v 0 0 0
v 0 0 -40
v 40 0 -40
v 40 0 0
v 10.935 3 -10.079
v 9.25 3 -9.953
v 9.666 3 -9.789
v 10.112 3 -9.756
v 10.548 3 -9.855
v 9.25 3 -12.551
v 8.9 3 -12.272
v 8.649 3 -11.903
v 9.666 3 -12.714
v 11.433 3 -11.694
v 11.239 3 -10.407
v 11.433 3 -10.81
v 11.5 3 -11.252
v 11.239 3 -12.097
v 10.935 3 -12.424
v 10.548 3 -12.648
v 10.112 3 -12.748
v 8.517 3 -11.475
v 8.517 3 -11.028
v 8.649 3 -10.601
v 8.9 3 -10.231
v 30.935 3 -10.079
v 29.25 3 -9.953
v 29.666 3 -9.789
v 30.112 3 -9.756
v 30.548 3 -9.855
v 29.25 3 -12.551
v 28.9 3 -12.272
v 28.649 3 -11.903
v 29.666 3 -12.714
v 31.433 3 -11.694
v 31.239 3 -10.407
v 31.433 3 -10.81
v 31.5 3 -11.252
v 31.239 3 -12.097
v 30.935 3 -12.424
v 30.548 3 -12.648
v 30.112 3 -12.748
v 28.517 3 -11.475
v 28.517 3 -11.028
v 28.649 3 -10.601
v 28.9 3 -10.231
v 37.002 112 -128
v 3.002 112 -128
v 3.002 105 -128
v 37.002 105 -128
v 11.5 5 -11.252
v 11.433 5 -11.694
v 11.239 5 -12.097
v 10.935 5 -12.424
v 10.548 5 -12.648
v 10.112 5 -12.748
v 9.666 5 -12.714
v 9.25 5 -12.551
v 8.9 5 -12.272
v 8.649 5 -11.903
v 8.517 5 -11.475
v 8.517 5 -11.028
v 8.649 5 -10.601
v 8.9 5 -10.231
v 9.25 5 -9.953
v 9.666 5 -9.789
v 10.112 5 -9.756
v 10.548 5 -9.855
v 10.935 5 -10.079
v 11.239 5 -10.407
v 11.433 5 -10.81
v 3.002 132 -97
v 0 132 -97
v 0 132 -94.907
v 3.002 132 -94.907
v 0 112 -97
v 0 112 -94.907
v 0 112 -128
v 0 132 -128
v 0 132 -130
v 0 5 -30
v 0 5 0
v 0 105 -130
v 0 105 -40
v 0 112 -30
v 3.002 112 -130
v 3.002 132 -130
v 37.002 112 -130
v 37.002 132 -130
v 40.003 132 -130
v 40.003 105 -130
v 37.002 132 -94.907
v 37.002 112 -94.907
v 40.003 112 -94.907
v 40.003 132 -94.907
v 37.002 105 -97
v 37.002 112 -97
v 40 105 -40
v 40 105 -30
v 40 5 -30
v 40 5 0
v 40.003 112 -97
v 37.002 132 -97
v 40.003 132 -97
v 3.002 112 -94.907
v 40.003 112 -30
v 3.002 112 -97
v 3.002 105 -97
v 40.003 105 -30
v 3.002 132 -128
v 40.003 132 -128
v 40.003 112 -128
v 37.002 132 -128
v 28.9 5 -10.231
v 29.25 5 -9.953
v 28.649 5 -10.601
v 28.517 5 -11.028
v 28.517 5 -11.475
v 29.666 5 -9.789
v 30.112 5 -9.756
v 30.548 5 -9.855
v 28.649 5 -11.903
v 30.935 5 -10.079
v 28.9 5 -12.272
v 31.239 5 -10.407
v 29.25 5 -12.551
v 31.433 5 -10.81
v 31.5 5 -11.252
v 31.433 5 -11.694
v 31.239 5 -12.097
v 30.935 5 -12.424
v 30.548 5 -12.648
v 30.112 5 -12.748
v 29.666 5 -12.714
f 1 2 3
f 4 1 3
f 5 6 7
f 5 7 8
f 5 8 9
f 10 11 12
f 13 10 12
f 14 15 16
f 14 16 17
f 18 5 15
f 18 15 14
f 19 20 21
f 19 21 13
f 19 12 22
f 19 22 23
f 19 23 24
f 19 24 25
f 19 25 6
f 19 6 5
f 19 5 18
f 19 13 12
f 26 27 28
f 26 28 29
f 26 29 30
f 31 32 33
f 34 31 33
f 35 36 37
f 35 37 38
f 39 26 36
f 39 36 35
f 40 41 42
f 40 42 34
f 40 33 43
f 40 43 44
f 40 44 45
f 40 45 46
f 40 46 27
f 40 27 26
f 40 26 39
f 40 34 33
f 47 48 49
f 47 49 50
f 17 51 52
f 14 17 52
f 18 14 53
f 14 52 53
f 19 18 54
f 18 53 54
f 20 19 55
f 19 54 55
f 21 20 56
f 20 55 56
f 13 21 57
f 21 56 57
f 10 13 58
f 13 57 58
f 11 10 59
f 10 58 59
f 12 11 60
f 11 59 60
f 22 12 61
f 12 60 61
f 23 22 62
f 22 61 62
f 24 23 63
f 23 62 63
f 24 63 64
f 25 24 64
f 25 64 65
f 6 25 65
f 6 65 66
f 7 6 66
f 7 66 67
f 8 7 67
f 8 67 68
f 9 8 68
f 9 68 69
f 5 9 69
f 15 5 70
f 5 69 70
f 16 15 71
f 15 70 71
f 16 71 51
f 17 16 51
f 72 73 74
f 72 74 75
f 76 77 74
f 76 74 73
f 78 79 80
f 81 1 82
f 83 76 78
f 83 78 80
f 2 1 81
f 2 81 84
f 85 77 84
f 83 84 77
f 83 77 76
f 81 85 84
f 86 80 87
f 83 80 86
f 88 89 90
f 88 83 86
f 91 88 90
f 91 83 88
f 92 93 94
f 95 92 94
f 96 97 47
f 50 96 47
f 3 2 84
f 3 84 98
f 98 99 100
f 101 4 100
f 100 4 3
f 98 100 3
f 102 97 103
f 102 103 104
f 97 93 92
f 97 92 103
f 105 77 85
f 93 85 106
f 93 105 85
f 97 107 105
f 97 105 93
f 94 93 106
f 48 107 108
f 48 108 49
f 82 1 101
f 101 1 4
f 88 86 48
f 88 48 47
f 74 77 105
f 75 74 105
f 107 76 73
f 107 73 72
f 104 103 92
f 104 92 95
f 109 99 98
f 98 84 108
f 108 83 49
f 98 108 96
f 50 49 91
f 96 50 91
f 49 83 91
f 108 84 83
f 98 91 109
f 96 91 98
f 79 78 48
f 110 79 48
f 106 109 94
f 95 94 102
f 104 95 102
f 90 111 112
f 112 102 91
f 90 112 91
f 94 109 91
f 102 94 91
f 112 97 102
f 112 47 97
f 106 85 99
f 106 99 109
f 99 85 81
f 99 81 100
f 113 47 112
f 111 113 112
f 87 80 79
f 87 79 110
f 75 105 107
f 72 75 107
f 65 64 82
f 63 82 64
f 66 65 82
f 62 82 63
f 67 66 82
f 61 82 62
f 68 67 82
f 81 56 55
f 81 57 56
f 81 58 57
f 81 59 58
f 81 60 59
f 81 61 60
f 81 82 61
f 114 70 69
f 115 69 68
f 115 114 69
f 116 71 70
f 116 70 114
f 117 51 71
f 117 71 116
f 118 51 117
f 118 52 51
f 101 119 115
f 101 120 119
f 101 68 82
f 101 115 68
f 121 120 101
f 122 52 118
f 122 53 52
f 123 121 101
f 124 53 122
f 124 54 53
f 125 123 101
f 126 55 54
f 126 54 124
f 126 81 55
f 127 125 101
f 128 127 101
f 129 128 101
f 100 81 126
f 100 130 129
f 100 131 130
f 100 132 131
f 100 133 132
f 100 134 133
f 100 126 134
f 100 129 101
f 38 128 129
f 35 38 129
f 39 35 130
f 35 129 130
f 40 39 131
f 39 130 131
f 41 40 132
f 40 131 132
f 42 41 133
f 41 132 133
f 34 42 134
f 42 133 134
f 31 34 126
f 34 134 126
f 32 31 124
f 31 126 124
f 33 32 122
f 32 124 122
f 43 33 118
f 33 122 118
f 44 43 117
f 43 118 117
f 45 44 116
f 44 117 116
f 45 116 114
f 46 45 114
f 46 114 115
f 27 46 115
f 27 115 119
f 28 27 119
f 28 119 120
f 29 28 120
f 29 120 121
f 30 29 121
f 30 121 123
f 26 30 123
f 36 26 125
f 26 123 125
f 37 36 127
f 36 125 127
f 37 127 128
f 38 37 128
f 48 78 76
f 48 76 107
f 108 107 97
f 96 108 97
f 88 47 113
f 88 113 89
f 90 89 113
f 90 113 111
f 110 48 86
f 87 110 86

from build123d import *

# Parameters (mm, degrees)
SKETCH1_W           = 40
SKETCH1_H           = 40
BOSS_EXTRUDE1_DEPTH = 5
SKETCH2_R           = 1.5
CUT_EXTRUDE1_DEPTH  = 2
SKETCH5_W           = 40
SKETCH5_H           = 10
BOSS_EXTRUDE2_DEPTH = 100
SKETCH6_W           = 40.003445824
SKETCH6_H           = 100
BOSS_EXTRUDE3_DEPTH = 7
SKETCH7_W           = 34
SKETCH7_H           = 31
CUT_EXTRUDE2_DEPTH  = 100
SKETCH8_W           = 3.001722912
SKETCH8_H           = 2
SKETCH8_H_2         = 2.093229538
BOSS_EXTRUDE4_DEPTH = 20


with BuildPart() as part:
    # Sketch1 → Boss-Extrude1 (new body)
    with BuildSketch(Plane(origin=(0, 0, 0), x_dir=(1, 0, 0), z_dir=(0, 1, 0))):
        with Locations((20, 20)):
            Rectangle(SKETCH1_W, SKETCH1_H)
    extrude(amount=BOSS_EXTRUDE1_DEPTH)

    # Sketch2 → Cut-Extrude1 (cut)
    with BuildSketch(Plane(origin=(0, 5, 0), x_dir=(1, 0, 0), z_dir=(0, 1, 0))):
        with Locations((10, 11.251726065)):
            Circle(SKETCH2_R)
        with Locations((30, 11.251726065)):
            Circle(SKETCH2_R)
    extrude(amount=-CUT_EXTRUDE1_DEPTH, mode=Mode.SUBTRACT)

    # Sketch5 → Boss-Extrude2 (add)
    with BuildSketch(Plane(origin=(0, 5, 0), x_dir=(1, 0, 0), z_dir=(0, 1, 0))):
        with Locations((20, 35)):
            Rectangle(SKETCH5_W, SKETCH5_H)
    extrude(amount=BOSS_EXTRUDE2_DEPTH)

    # Sketch6 → Boss-Extrude3 (add)
    with BuildSketch(Plane(origin=(0, 105, 0), x_dir=(1, 0, 0), z_dir=(0, 1, 0))):
        with Locations((20.001722912, 80)):
            Rectangle(SKETCH6_W, SKETCH6_H)
    extrude(amount=BOSS_EXTRUDE3_DEPTH)

    # Sketch7 → Cut-Extrude2 (cut)
    with BuildSketch(Plane(origin=(0, 112, 0), x_dir=(1, 0, 0), z_dir=(0, 1, 0))):
        with Locations((20.001722912, 112.5)):
            Rectangle(SKETCH7_W, SKETCH7_H)
    extrude(amount=-CUT_EXTRUDE2_DEPTH, mode=Mode.SUBTRACT)

    # Sketch8 → Boss-Extrude4 (add)
    with BuildSketch(Plane(origin=(0, 112, 0), x_dir=(1, 0, 0), z_dir=(0, 1, 0))):
        with Locations((38.502584368, 129)):
            Rectangle(SKETCH8_W, SKETCH8_H)
        with Locations((1.500861456, 129)):
            Rectangle(SKETCH8_W, SKETCH8_H)
        with Locations((1.500861456, 95.953385231)):
            Rectangle(SKETCH8_W, SKETCH8_H_2)
        with Locations((38.502584368, 95.953385231)):
            Rectangle(SKETCH8_W, SKETCH8_H_2)
    extrude(amount=BOSS_EXTRUDE4_DEPTH)


solid = part.part
